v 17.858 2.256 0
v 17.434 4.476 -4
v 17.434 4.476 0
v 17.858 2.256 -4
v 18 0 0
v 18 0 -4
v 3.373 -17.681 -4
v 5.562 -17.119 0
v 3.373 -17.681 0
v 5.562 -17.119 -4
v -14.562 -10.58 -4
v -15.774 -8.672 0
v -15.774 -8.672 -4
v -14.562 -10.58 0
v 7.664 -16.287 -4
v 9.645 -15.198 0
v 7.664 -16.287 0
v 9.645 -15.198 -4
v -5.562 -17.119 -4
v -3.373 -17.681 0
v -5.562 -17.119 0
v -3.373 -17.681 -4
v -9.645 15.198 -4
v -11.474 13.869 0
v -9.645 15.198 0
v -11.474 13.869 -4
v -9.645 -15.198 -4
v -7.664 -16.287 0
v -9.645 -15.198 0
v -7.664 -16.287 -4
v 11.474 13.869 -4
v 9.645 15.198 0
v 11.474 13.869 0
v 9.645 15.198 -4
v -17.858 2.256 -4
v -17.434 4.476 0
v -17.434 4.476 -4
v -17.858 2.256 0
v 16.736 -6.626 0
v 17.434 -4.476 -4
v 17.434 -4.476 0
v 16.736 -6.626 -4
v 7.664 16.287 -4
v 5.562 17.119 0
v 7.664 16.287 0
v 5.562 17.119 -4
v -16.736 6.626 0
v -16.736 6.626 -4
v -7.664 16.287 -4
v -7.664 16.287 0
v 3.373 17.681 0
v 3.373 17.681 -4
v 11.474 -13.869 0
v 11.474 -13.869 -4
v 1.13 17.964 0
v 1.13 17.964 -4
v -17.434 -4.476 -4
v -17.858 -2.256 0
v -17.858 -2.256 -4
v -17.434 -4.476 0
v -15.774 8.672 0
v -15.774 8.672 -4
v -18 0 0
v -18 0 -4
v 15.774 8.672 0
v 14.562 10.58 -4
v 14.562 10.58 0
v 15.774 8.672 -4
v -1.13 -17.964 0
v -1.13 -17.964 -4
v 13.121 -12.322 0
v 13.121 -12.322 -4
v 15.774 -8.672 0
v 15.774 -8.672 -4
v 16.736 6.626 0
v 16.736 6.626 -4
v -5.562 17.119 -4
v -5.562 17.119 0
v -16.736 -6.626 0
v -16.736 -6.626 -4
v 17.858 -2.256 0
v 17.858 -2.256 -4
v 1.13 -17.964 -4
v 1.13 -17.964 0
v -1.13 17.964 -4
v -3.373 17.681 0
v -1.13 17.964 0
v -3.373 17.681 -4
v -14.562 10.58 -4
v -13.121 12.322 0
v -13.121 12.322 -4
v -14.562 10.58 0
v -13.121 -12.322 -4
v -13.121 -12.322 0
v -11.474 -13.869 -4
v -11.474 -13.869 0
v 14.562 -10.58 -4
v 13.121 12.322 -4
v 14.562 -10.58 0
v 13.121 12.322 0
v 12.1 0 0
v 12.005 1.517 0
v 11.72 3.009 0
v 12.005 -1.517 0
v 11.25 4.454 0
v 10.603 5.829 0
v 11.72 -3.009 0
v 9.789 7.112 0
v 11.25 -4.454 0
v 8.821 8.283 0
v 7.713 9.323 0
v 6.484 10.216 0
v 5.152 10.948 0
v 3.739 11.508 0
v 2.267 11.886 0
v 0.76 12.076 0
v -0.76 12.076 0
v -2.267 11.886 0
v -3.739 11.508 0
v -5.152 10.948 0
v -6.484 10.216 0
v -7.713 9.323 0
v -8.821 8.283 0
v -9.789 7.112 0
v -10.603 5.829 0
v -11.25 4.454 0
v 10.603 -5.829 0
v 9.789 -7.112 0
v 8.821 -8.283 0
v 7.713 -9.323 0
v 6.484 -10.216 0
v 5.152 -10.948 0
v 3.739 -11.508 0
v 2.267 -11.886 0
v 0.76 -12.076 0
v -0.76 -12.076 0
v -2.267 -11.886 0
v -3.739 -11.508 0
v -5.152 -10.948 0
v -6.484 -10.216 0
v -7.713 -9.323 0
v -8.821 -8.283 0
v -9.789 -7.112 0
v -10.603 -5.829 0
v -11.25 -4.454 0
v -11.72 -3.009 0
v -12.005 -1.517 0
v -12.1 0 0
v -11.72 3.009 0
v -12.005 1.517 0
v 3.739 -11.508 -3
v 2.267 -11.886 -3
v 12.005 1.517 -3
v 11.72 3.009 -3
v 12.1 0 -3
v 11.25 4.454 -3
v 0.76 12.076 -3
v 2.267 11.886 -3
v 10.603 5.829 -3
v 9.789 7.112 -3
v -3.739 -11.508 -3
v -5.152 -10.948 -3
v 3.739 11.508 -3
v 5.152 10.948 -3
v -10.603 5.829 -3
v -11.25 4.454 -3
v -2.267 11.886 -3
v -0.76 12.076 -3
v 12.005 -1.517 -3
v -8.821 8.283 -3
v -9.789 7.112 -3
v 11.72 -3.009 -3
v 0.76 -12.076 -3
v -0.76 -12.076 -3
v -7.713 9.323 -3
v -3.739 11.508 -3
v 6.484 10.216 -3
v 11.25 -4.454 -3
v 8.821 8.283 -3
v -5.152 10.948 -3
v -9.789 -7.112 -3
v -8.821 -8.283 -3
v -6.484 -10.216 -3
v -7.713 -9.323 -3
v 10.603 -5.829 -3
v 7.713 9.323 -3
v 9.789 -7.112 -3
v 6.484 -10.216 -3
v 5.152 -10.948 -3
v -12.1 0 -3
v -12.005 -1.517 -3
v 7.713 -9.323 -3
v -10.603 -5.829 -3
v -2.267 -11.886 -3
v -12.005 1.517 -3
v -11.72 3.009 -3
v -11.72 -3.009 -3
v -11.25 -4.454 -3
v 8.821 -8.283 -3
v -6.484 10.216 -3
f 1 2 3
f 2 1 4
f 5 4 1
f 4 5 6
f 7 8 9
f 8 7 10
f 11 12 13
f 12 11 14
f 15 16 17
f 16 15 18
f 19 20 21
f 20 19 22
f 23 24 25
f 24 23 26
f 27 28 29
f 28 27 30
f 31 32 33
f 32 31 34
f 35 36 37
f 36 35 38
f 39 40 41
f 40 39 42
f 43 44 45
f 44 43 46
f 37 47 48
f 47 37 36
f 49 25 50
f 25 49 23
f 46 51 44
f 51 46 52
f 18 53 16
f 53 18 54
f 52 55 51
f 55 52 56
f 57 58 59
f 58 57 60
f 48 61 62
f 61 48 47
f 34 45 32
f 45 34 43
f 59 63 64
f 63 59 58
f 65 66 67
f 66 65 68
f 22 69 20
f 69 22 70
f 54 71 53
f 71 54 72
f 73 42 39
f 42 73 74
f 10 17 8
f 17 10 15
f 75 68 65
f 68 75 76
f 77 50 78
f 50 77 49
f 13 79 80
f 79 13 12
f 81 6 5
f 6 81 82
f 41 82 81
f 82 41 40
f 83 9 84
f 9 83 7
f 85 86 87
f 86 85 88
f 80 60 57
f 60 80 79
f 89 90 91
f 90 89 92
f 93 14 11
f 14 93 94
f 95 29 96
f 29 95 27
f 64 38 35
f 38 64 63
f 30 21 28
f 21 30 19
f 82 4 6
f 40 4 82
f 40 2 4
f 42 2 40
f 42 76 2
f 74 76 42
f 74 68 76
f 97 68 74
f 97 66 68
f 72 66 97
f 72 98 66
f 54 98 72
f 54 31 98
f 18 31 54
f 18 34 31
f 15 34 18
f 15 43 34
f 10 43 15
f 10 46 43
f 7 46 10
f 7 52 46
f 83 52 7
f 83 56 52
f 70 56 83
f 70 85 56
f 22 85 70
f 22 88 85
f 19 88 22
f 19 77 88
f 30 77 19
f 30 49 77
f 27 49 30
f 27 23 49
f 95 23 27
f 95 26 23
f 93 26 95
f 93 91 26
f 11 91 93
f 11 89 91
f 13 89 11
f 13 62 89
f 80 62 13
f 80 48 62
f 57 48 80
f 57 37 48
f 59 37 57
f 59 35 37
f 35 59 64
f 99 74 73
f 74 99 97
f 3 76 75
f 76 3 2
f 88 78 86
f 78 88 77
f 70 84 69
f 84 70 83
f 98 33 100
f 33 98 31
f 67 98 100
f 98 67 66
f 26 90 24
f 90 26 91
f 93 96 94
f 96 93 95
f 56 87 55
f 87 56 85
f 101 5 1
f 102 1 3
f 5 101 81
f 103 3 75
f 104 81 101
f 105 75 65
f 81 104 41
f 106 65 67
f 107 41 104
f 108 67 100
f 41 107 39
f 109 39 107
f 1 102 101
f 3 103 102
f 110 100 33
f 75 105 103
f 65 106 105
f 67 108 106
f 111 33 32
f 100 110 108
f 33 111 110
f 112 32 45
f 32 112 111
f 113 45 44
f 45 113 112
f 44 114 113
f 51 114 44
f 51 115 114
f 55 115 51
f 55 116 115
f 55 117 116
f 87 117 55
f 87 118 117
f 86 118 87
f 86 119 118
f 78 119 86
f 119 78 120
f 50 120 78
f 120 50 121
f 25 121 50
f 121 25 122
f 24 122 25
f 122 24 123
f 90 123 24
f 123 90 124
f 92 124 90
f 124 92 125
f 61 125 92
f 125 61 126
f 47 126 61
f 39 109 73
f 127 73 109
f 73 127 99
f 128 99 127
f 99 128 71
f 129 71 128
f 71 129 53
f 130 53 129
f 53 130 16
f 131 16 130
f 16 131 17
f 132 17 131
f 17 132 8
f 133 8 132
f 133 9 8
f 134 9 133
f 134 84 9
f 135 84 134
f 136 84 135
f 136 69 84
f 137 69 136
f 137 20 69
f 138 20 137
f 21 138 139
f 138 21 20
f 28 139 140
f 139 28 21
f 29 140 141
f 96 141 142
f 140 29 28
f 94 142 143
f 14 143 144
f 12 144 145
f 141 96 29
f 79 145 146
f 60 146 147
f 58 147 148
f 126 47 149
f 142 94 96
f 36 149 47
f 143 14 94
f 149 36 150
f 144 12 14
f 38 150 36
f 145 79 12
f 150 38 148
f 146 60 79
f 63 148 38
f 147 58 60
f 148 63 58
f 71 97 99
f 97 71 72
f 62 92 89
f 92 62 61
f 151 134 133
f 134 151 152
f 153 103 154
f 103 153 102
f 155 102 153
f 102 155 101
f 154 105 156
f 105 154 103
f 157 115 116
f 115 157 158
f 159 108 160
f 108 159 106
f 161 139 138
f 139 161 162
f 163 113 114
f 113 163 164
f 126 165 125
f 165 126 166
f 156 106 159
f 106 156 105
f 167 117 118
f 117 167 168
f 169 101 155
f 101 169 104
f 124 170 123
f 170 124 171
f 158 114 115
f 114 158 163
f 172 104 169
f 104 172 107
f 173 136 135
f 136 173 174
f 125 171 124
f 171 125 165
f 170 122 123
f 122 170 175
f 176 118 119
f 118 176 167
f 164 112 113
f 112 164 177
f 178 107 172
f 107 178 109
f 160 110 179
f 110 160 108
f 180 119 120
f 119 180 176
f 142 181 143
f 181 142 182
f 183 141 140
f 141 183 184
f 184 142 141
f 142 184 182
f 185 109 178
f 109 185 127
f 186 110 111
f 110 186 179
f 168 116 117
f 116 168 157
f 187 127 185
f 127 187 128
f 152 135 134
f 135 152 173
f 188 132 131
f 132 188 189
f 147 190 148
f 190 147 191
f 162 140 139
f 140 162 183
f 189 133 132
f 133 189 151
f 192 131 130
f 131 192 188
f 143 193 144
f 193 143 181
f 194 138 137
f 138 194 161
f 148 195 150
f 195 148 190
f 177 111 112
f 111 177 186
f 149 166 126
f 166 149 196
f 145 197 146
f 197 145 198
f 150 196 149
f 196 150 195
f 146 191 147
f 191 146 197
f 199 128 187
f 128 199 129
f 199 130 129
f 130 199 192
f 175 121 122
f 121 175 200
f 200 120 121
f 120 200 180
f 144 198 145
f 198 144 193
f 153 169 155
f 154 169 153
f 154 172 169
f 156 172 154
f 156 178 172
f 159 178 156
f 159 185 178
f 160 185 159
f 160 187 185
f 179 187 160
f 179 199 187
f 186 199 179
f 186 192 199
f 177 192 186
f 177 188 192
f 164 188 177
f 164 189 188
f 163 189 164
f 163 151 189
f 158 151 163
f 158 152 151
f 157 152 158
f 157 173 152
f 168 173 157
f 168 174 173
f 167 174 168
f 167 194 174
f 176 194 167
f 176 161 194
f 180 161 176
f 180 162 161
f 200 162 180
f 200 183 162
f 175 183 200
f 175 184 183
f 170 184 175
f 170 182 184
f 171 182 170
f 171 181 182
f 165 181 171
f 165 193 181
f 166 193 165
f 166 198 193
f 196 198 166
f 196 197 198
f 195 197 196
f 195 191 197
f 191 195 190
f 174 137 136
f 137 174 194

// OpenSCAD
$fn = 50;


difference() {
	union() {
		translate(v = [0, 0, -4.0000000000]) {
			cylinder(h = 4, r = 18.0000000000);
		}
	}
	union() {
		#translate(v = [0, 0, -3.0000000000]) {
			cylinder(h = 3, r = 12.1000000000);
		}
	}
}
